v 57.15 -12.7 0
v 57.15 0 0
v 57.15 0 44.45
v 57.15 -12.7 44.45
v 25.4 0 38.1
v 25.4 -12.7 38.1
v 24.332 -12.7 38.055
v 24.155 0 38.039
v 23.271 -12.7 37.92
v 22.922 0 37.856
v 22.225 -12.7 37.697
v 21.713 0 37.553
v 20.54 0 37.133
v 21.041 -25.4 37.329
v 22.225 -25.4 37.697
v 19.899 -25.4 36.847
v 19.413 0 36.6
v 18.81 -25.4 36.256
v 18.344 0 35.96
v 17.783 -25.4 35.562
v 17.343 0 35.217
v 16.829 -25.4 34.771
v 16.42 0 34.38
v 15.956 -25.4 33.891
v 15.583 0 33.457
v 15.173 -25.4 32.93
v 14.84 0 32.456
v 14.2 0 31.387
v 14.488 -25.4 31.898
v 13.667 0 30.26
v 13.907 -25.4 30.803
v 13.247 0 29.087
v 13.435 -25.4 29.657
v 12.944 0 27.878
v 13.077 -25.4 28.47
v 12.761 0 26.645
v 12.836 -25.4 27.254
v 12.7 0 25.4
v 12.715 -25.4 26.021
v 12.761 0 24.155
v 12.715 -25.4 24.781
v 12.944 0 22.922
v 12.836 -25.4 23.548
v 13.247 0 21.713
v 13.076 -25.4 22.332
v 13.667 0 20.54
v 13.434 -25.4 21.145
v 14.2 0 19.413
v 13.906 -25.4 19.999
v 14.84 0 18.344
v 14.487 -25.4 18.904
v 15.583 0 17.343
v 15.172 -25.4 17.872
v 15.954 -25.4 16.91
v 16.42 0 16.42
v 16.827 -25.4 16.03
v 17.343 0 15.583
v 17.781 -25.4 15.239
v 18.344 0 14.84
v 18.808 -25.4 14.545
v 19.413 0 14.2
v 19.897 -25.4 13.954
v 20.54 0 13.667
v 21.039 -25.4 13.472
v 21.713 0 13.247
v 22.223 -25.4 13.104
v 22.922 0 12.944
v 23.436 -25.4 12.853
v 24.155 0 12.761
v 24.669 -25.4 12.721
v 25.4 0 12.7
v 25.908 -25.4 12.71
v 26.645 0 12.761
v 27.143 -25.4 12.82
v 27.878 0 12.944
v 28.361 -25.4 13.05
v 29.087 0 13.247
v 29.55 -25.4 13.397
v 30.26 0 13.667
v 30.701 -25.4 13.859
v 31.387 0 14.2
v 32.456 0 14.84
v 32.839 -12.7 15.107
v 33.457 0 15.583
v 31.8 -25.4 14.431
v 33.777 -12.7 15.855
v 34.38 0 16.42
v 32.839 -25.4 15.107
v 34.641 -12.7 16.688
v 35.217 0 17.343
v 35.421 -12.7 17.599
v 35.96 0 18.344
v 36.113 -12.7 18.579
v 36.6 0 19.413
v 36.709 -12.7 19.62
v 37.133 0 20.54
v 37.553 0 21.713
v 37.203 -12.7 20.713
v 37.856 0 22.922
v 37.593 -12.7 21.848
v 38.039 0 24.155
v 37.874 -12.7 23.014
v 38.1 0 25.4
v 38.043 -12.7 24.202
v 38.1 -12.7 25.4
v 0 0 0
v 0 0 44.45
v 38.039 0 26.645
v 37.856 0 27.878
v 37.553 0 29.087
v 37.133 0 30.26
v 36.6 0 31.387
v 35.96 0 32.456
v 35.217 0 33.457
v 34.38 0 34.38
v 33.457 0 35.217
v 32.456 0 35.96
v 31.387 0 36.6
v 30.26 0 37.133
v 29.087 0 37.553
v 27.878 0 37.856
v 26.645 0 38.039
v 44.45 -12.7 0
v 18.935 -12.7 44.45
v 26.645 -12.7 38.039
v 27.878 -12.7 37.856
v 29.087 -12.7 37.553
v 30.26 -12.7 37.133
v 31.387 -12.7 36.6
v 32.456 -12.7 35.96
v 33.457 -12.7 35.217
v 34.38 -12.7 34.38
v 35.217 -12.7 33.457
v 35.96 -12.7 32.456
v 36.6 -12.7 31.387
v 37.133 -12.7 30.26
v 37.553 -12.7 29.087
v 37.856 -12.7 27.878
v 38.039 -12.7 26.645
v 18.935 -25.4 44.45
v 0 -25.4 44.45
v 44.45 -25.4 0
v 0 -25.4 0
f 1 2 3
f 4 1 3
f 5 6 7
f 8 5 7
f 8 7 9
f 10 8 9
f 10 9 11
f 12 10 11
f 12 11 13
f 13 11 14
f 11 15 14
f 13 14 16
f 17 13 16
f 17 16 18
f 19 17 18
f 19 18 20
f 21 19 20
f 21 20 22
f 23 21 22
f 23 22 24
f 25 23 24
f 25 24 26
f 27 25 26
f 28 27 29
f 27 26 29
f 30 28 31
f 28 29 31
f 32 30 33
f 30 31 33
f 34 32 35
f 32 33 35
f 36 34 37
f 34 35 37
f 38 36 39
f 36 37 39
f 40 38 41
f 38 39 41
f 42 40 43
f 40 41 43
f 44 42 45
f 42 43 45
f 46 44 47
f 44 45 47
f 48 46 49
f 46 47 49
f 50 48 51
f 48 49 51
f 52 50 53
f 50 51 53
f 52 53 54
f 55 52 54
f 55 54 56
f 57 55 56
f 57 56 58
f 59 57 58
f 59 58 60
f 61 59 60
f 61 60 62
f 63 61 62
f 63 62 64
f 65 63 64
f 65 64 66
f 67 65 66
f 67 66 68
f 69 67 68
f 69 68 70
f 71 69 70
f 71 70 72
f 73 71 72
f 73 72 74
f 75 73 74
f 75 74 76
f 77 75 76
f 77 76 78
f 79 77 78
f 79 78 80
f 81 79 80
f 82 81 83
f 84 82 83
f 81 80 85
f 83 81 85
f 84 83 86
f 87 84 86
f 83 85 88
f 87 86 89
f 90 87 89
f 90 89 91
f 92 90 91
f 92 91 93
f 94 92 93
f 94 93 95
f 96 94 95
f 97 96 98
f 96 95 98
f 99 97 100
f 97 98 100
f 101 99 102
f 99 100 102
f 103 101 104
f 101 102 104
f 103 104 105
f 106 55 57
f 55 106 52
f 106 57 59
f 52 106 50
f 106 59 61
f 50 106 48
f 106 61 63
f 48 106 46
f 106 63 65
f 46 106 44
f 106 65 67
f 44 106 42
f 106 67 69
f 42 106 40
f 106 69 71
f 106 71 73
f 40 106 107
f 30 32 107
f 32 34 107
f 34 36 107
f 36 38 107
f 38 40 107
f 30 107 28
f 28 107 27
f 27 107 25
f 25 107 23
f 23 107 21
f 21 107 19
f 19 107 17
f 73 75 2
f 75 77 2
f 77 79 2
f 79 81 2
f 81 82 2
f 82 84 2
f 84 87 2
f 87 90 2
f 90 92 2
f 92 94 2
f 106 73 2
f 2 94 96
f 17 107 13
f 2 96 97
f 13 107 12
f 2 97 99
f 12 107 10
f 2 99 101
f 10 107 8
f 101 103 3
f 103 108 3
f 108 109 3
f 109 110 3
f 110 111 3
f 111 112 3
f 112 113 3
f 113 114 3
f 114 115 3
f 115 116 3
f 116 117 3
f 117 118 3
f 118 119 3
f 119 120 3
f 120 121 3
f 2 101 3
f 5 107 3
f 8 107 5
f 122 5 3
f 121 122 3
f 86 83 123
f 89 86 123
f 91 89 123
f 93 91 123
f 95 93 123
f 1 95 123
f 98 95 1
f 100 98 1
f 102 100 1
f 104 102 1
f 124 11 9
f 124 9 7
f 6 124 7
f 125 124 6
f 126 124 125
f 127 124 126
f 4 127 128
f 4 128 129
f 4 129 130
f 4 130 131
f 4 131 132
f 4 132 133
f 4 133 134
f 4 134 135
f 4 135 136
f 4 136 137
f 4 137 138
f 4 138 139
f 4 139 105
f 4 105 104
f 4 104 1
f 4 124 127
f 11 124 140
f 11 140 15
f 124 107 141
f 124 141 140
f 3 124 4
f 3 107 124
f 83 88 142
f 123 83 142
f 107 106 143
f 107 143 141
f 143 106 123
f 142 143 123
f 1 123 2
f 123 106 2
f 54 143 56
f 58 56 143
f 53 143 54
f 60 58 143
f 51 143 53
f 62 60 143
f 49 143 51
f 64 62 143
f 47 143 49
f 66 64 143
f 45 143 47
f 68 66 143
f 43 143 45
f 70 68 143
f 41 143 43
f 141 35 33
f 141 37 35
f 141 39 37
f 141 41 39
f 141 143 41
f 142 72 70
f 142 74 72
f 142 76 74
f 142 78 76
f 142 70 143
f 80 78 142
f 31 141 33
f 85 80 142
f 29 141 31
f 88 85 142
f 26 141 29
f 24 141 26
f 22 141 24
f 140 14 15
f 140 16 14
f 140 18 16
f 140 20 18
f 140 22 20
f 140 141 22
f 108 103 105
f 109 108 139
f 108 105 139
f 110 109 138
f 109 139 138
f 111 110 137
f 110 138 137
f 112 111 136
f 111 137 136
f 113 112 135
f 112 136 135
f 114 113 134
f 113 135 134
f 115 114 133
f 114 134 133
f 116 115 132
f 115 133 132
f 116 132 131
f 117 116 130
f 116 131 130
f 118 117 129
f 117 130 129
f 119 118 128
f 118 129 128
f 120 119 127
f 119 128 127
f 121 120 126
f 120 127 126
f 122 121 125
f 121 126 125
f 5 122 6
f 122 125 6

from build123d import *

# Parameters (mm, degrees)
F0_W     = 57.15
F0_H     = 44.45
F1_DEPTH = 25.4
F3_DEPTH = 25.401
F5_DEPTH = 12.7


with BuildPart() as f1:
    # F0 (on Front) → F1 (new body)
    with BuildSketch(Plane.XZ):
        with Locations((28.575, 22.225)):
            Rectangle(F0_W, F0_H)
    extrude(amount=F1_DEPTH)

    # F2 (on face) → F3 (cut, through all)
    with BuildSketch(Plane.XZ.offset(25.4)):
        with BuildLine():
            ThreePointArc((25.4, 38.1), (16.4197438789, 16.4197438789), (38.1, 25.4))
            ThreePointArc((38.1, 25.4), (34.3802561211, 34.3802561211), (25.4, 38.1))
        make_face()
    extrude(amount=-F3_DEPTH, mode=Mode.SUBTRACT)

    # F4 (on face) → F5 (cut)
    with BuildSketch(Plane.XZ.offset(25.4)):
        with BuildLine():
            Line((57.15, 44.45), (18.9351793379, 44.45))
            Line((18.9351793379, 44.45), (22.225, 37.6967221242))
            ThreePointArc((22.225, 37.6967221242), (33.1771299333, 35.440231571), (38.1, 25.4))
            ThreePointArc((38.1, 25.4), (36.7085708258, 19.6201880759), (32.8391770271, 15.1068641727))
            Line((32.8391770271, 15.1068641727), (44.45, 0))
            Line((44.45, 0), (57.15, 0))
            Line((57.15, 0), (57.15, 44.45))
        make_face()
    extrude(amount=-F5_DEPTH, mode=Mode.SUBTRACT)


solid = f1.part
